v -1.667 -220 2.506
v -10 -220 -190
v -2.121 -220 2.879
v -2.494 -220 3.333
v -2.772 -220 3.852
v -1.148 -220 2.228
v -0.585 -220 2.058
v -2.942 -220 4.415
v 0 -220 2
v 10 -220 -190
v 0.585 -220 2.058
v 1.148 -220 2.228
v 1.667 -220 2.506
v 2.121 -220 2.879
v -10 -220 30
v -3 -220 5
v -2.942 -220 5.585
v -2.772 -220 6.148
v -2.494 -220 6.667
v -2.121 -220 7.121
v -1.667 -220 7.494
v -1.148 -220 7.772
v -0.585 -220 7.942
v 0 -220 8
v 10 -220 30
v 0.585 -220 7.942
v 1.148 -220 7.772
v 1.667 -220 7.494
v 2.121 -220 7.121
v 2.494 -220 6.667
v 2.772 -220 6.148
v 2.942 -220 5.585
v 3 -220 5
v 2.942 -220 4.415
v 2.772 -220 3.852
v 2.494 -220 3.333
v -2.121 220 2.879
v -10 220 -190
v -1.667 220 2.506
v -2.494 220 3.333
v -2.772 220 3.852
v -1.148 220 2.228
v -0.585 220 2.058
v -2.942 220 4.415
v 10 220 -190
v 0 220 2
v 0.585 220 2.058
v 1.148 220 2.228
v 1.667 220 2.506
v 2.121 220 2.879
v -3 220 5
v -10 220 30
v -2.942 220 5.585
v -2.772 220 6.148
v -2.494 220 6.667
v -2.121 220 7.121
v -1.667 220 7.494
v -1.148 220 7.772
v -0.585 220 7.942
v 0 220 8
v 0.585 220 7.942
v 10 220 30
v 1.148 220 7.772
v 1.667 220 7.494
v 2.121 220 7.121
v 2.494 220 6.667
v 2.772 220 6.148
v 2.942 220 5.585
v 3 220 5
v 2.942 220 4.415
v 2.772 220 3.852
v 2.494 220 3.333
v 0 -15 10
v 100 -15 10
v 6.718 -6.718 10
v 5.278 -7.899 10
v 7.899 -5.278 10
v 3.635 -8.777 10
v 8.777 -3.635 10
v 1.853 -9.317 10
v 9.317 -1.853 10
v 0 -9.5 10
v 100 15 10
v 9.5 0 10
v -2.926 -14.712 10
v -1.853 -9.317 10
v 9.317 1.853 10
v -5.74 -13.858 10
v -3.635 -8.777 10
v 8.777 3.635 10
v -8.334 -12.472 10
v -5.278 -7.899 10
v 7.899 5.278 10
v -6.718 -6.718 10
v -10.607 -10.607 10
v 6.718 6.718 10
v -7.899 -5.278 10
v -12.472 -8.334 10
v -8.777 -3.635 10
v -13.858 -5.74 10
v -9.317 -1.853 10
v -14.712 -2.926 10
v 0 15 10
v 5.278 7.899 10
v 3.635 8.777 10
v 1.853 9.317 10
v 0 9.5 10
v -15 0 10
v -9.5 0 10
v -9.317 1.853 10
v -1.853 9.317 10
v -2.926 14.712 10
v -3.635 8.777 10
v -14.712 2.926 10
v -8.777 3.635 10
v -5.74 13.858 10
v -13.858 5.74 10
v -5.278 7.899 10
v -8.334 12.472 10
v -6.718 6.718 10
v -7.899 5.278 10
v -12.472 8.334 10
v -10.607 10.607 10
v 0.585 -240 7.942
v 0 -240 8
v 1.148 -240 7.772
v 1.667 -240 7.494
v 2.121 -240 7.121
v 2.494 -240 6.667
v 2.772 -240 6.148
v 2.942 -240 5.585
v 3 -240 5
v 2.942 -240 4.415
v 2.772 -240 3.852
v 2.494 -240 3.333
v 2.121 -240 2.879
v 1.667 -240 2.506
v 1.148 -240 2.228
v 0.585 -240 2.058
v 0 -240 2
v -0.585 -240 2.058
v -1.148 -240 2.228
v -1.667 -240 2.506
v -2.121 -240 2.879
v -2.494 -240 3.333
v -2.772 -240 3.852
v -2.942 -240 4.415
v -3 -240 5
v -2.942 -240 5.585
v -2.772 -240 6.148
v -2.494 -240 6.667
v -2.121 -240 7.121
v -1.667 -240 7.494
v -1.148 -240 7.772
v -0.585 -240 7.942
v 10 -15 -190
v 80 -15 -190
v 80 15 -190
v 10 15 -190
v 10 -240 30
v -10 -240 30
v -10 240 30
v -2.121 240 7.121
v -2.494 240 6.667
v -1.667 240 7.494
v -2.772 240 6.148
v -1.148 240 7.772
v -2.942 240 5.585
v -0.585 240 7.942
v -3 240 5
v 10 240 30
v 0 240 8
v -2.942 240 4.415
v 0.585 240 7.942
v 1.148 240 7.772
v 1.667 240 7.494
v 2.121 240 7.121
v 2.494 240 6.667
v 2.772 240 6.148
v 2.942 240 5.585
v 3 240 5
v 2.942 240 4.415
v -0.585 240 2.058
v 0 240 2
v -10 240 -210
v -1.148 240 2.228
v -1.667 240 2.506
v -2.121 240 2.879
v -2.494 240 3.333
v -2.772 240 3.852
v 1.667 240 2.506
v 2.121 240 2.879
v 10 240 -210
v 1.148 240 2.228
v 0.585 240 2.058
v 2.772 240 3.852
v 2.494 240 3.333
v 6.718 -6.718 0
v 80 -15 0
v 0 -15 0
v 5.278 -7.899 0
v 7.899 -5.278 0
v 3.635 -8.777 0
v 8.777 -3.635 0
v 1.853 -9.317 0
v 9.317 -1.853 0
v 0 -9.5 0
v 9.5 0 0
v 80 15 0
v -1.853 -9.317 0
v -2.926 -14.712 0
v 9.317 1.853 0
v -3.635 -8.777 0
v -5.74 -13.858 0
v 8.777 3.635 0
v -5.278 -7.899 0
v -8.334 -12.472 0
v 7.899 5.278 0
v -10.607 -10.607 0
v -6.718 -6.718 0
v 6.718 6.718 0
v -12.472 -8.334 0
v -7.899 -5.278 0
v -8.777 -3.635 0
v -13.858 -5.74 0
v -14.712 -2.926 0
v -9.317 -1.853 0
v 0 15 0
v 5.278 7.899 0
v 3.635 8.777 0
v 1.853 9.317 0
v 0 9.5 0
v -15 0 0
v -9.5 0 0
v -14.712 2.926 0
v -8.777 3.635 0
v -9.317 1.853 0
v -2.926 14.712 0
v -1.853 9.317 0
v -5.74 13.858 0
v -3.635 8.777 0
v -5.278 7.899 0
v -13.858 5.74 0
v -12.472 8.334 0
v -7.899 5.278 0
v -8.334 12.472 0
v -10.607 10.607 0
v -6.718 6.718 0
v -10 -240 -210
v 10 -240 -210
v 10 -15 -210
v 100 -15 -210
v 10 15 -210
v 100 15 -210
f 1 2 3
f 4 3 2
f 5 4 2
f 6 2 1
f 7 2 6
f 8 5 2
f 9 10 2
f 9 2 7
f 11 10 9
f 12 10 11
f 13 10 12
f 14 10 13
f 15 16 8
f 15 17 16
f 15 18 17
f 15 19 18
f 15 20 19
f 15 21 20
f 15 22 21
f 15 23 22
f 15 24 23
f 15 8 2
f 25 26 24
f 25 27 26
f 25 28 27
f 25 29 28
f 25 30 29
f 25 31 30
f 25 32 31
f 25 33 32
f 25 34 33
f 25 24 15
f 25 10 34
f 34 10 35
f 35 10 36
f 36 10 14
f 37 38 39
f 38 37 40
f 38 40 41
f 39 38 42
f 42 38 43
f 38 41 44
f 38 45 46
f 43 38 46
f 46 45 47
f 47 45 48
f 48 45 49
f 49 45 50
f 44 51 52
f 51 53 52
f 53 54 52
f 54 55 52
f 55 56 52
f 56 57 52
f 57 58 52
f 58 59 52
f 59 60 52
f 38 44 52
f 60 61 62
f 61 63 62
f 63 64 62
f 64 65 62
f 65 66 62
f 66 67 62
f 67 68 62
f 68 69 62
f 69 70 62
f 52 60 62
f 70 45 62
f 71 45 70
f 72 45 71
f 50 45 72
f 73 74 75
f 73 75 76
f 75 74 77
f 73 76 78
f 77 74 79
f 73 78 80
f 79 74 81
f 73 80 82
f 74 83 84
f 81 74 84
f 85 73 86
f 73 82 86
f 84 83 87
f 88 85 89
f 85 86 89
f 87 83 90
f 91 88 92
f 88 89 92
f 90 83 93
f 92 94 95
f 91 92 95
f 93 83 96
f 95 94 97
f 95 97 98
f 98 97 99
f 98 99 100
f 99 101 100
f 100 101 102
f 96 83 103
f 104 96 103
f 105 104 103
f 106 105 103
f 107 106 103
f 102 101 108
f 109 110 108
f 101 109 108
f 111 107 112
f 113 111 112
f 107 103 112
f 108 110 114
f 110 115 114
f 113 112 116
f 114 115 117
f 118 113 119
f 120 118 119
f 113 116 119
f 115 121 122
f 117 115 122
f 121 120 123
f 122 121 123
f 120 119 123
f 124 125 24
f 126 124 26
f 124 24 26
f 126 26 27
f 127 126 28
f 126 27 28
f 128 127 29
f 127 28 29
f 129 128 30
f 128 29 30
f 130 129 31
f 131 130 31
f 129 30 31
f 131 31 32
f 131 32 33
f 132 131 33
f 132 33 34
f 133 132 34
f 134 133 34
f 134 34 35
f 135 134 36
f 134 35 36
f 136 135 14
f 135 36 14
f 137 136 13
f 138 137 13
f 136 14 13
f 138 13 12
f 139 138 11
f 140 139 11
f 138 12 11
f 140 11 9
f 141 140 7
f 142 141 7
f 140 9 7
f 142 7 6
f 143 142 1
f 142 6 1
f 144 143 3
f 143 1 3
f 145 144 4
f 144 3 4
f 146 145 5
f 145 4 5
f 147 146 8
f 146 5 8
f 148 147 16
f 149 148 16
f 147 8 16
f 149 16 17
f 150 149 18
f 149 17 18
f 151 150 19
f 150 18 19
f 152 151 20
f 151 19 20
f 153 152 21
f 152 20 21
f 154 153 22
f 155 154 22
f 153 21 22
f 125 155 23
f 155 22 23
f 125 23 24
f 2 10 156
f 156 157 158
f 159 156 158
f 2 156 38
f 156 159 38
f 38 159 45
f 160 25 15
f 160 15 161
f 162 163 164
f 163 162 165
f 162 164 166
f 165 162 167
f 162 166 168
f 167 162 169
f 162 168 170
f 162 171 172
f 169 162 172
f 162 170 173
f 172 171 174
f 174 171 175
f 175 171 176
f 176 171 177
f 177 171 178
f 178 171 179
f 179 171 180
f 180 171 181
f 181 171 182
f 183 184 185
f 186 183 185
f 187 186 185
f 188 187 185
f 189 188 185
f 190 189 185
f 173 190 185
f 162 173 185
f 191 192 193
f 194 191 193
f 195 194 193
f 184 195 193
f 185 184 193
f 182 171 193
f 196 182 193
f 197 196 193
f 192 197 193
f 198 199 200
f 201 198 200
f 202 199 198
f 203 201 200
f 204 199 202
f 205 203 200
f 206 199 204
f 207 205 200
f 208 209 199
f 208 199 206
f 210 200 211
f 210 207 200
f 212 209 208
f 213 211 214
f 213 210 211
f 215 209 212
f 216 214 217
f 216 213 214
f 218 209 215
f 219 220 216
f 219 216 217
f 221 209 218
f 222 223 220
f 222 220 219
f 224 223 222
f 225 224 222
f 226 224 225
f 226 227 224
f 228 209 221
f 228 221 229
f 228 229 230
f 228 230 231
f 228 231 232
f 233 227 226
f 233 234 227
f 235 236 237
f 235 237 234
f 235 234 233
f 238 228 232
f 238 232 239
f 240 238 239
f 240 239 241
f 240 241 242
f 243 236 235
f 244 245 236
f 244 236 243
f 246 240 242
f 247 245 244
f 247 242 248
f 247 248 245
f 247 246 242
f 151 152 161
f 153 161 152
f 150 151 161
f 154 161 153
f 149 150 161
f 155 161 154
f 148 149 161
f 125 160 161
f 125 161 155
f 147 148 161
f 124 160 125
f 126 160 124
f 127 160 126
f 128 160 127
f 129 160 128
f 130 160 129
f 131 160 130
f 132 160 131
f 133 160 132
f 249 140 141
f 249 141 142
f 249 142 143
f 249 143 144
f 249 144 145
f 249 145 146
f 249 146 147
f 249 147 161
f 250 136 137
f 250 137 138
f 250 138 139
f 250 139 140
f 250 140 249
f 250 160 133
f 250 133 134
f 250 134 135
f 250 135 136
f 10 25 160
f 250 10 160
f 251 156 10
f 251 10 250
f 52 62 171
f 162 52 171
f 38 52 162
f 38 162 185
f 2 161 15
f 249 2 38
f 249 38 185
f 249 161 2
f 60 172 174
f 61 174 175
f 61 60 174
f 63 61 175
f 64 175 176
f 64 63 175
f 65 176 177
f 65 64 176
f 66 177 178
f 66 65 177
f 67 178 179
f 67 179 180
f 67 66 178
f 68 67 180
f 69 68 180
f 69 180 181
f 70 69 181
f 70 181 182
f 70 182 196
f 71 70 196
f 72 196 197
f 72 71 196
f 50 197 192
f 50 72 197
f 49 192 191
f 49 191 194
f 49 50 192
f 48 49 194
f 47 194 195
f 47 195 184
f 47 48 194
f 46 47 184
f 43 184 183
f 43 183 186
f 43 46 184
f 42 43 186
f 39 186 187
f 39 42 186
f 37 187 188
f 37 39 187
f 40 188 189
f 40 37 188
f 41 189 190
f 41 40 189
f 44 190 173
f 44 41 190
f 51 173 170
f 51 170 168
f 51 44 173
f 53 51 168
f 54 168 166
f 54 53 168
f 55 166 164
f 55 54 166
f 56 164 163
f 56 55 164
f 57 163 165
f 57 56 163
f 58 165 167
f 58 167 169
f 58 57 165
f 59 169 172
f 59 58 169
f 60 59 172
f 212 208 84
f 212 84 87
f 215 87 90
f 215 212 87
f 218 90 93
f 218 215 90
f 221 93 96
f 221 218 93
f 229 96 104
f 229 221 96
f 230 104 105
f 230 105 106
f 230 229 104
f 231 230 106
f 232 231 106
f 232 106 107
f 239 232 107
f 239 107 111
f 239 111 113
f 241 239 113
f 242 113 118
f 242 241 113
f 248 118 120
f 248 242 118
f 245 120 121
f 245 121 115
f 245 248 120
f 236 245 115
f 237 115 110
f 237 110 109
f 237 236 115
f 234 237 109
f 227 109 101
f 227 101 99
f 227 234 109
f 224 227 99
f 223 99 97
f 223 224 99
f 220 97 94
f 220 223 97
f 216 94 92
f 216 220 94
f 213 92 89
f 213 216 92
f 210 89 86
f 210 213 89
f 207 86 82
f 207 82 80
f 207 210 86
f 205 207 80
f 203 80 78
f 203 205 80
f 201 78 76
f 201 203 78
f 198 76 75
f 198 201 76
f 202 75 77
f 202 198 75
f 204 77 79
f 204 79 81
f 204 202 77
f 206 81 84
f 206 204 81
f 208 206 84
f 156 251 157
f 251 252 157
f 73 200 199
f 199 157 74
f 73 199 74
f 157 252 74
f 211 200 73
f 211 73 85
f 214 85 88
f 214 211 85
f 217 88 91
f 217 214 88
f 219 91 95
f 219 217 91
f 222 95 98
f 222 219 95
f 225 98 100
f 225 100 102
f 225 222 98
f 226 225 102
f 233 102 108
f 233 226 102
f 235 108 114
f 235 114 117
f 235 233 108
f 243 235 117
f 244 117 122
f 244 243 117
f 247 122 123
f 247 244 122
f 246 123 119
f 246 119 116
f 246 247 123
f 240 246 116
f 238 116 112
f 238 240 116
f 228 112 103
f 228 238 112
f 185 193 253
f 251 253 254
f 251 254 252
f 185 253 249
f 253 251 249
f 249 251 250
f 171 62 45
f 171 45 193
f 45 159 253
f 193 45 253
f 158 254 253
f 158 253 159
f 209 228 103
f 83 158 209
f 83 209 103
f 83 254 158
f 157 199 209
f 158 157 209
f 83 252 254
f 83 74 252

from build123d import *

# Parameters (mm, degrees)
SKETCH_1_R          = 9.5
EXTRUDE_1_DEPTH     = 10
SKETCH_2_W          = 20
SKETCH_2_H          = 30
EXTRUDE_2_DEPTH     = 210
SKETCH_3_W          = 20
SKETCH_3_H          = 30
EXTRUDE_3_DEPTH     = 70
EXTRUDE_4_DEPTH     = 20
SKETCH_5_R          = 3
CUT_EXTRUDE_1_DEPTH = 20


with BuildPart() as part:
    # 草图1 → 凸台-拉伸1 (new body)
    with BuildSketch(Plane.XY):
        with BuildLine():
            Line((0, 15), (100, 15))
            Line((100, 15), (100, -15))
            Line((100, -15), (0, -15))
            ThreePointArc((0, -15), (-15, 0), (0, 15))
        make_face()
        Circle(SKETCH_1_R, mode=Mode.SUBTRACT)
    extrude(amount=EXTRUDE_1_DEPTH)

    # 草图2 → 凸台-拉伸2 (add)
    with BuildSketch(Plane(origin=(0, 0, 0), x_dir=(-1, 0, 0), z_dir=(0, 0, -1))):
        with Locations((-90, 0)):
            Rectangle(SKETCH_2_W, SKETCH_2_H)
    extrude(amount=EXTRUDE_2_DEPTH)

    # 草图3 → 凸台-拉伸3 (add)
    with BuildSketch(Plane.ZY.offset(-80)):
        with Locations((-200, 0)):
            Rectangle(SKETCH_3_W, SKETCH_3_H)
    extrude(amount=EXTRUDE_3_DEPTH)

    # 草图4 → 凸台-拉伸4 (add)
    with BuildSketch(Plane.ZY.offset(-10)):
        Polygon((-190, 0), (-190, -220), (30, -220), (30, -240), (-210, -240), (-210, 0), align=None)
    extrude_4 = extrude(amount=EXTRUDE_4_DEPTH)

    # 镜向1: 凸台-拉伸4 across plane
    add(extrude_4.mirror(Plane(origin=(-10, 0, -210), x_dir=(0, 0, 1), z_dir=(0, -1, 0))))

    # 草图5 → 切除-拉伸1 (cut)
    with BuildSketch(Plane(origin=(0, -220, 0), x_dir=(1, 0, 0), z_dir=(0, 1, 0))):
        with Locations((0, -5)):
            Circle(SKETCH_5_R)
    cut_extrude_1 = extrude(amount=-CUT_EXTRUDE_1_DEPTH, mode=Mode.SUBTRACT)

    # 镜向2: 切除-拉伸1 across plane
    add(cut_extrude_1.mirror(Plane.ZX), mode=Mode.SUBTRACT)


solid = part.part
